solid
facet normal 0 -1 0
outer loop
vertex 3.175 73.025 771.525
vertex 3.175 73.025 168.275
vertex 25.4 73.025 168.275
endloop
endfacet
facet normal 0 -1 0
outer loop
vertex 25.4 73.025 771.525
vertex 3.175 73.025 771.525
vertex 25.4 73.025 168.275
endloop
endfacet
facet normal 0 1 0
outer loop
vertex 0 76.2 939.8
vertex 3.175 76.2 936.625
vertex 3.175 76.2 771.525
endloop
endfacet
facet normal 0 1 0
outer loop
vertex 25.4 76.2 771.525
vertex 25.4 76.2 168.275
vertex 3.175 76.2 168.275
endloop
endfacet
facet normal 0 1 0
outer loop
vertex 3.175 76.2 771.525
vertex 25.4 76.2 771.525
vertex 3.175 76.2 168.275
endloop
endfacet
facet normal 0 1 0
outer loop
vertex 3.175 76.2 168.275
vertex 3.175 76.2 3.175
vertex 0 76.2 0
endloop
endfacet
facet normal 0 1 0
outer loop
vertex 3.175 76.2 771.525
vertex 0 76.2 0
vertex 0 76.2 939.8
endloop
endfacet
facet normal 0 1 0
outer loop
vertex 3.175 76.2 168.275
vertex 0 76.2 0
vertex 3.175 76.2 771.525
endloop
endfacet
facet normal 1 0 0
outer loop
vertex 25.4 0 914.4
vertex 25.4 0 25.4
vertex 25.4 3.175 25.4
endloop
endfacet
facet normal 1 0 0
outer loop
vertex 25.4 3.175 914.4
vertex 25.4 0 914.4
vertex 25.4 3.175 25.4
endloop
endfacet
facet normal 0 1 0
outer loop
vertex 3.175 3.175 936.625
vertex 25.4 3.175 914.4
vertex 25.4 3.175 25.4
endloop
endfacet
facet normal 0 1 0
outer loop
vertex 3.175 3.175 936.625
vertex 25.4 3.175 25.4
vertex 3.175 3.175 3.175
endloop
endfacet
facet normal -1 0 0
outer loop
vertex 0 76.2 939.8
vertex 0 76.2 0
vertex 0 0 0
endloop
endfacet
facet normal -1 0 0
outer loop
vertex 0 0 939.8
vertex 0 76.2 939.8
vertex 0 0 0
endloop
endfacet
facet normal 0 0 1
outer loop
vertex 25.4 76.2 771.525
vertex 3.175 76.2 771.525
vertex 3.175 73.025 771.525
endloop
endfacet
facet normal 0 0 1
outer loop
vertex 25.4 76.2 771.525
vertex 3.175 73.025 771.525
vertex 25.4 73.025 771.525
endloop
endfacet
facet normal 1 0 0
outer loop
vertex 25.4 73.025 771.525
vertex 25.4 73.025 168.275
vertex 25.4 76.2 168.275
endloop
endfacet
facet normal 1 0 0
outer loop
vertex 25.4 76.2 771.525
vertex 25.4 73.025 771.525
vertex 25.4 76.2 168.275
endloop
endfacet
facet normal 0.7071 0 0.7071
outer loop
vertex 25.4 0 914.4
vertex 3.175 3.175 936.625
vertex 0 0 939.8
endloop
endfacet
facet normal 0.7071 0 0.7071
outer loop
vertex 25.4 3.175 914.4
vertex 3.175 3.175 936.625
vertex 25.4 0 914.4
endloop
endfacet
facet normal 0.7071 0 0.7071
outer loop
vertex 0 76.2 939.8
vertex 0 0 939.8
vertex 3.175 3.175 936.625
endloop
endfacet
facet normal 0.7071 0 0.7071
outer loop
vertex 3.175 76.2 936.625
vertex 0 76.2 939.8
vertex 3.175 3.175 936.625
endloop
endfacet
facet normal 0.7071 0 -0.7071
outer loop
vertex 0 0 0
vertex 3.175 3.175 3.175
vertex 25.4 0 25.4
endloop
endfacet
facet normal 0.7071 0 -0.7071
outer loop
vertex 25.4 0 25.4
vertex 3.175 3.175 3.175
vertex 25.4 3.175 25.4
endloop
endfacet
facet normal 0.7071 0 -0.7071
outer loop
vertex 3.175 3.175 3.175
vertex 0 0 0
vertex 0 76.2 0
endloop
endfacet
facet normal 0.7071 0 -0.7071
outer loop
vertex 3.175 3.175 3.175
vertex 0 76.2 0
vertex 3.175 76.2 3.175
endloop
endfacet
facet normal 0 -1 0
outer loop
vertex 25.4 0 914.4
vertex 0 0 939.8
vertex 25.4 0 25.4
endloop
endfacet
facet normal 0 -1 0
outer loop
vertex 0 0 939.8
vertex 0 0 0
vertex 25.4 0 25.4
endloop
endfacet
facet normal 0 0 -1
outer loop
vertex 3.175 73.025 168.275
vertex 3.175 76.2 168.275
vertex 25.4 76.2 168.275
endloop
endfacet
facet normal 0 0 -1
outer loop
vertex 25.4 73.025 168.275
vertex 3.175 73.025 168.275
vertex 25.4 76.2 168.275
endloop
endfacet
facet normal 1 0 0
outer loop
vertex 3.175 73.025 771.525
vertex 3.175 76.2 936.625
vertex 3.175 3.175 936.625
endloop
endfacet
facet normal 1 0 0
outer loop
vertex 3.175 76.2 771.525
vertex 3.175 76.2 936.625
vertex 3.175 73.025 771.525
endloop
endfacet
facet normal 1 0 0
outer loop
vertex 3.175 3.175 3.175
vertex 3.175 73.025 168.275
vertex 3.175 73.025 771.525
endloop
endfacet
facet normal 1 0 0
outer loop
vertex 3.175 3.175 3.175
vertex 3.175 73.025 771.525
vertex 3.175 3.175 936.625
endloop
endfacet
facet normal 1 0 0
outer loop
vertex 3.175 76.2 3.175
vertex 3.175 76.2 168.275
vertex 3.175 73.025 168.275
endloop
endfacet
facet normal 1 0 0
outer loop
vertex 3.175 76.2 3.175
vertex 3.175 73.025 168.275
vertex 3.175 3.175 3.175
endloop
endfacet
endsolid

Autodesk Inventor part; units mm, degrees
ref_plane "YZ Plane" through (0, 0, 0) normal (1, 0, 0) x (0, 1, 0)
ref_plane "XZ Plane" through (0, 0, 0) normal (0, 1, 0) x (-1, 0, 0)
ref_plane "XY Plane" through (0, 0, 0) normal (0, 0, 1) x (1, 0, 0)
sketch "Sketch1" plane through (0, 0, 0) normal (0, 0, 1) x (1, 0, 0)
  line L0 (0, 0) -> (25.4, 0)
  line L1 (25.4, 76.2) -> (0, 76.2)
  line L2 (0, 76.2) -> (0, 0)
  line L3 (25.4, 3.175) -> (3.175, 3.175)
  line L4 (3.175, 3.175) -> (3.175, 73.025)
  line L5 (3.175, 73.025) -> (25.4, 73.025)
  line L6 (25.4, 0) -> (25.4, 3.175)
  line L7 (25.4, 73.025) -> (25.4, 76.2)
  dimension "d0" = 76.2
  dimension "d1" = 25.4
  dimension "d2" = 3.175
  dimension "d3" = 3.175
  dimension "d4" = 3.175
extrude "Extrusion1" add sketch "Sketch1" along normal blind 939.8
sketch "Sketch2" plane through (0, 76.2, 0) normal (0, 1, 0) x (1, 0, 0)
  line L0 (0, -939.8) -> (25.4, -939.8) projected
  line L1 (25.4, 0) -> (25.4, -939.8) projected
  line L2 (25.4, 0) -> (0, 0) projected
  line L3 (0, 0) -> (0, -939.8) projected
  line L4 (0, -939.8) -> (25.4, -914.4)
  line L5 (0, 0) -> (25.4, -25.4)
  line L6 (3.175, -936.625) -> (3.175, -771.525)
  line L7 (3.175, -771.525) -> (25.4, -771.525)
  line L8 (3.175, -3.175) -> (3.175, -168.275)
  line L9 (3.175, -168.275) -> (25.4, -168.275)
  dimension "d7" = 45
  dimension "d8" = 3.175
  dimension "d9" = 165.1
  dimension "d10" = 165.1
extrude "Extrusion2" cut sketch "Sketch2" against normal through all contours L4 L1 L0 | L2 L1 L5
extrude "Extrusion3" cut sketch "Sketch2" against normal up to next contours L6 L7 L1 L4 | L5 L1 L9 L8
equation "\"d3\" = d2"
equation "\"d4\" = d2"
equation "\"d10\" = d9"
properties part number "frame U 1 by 3 long"
